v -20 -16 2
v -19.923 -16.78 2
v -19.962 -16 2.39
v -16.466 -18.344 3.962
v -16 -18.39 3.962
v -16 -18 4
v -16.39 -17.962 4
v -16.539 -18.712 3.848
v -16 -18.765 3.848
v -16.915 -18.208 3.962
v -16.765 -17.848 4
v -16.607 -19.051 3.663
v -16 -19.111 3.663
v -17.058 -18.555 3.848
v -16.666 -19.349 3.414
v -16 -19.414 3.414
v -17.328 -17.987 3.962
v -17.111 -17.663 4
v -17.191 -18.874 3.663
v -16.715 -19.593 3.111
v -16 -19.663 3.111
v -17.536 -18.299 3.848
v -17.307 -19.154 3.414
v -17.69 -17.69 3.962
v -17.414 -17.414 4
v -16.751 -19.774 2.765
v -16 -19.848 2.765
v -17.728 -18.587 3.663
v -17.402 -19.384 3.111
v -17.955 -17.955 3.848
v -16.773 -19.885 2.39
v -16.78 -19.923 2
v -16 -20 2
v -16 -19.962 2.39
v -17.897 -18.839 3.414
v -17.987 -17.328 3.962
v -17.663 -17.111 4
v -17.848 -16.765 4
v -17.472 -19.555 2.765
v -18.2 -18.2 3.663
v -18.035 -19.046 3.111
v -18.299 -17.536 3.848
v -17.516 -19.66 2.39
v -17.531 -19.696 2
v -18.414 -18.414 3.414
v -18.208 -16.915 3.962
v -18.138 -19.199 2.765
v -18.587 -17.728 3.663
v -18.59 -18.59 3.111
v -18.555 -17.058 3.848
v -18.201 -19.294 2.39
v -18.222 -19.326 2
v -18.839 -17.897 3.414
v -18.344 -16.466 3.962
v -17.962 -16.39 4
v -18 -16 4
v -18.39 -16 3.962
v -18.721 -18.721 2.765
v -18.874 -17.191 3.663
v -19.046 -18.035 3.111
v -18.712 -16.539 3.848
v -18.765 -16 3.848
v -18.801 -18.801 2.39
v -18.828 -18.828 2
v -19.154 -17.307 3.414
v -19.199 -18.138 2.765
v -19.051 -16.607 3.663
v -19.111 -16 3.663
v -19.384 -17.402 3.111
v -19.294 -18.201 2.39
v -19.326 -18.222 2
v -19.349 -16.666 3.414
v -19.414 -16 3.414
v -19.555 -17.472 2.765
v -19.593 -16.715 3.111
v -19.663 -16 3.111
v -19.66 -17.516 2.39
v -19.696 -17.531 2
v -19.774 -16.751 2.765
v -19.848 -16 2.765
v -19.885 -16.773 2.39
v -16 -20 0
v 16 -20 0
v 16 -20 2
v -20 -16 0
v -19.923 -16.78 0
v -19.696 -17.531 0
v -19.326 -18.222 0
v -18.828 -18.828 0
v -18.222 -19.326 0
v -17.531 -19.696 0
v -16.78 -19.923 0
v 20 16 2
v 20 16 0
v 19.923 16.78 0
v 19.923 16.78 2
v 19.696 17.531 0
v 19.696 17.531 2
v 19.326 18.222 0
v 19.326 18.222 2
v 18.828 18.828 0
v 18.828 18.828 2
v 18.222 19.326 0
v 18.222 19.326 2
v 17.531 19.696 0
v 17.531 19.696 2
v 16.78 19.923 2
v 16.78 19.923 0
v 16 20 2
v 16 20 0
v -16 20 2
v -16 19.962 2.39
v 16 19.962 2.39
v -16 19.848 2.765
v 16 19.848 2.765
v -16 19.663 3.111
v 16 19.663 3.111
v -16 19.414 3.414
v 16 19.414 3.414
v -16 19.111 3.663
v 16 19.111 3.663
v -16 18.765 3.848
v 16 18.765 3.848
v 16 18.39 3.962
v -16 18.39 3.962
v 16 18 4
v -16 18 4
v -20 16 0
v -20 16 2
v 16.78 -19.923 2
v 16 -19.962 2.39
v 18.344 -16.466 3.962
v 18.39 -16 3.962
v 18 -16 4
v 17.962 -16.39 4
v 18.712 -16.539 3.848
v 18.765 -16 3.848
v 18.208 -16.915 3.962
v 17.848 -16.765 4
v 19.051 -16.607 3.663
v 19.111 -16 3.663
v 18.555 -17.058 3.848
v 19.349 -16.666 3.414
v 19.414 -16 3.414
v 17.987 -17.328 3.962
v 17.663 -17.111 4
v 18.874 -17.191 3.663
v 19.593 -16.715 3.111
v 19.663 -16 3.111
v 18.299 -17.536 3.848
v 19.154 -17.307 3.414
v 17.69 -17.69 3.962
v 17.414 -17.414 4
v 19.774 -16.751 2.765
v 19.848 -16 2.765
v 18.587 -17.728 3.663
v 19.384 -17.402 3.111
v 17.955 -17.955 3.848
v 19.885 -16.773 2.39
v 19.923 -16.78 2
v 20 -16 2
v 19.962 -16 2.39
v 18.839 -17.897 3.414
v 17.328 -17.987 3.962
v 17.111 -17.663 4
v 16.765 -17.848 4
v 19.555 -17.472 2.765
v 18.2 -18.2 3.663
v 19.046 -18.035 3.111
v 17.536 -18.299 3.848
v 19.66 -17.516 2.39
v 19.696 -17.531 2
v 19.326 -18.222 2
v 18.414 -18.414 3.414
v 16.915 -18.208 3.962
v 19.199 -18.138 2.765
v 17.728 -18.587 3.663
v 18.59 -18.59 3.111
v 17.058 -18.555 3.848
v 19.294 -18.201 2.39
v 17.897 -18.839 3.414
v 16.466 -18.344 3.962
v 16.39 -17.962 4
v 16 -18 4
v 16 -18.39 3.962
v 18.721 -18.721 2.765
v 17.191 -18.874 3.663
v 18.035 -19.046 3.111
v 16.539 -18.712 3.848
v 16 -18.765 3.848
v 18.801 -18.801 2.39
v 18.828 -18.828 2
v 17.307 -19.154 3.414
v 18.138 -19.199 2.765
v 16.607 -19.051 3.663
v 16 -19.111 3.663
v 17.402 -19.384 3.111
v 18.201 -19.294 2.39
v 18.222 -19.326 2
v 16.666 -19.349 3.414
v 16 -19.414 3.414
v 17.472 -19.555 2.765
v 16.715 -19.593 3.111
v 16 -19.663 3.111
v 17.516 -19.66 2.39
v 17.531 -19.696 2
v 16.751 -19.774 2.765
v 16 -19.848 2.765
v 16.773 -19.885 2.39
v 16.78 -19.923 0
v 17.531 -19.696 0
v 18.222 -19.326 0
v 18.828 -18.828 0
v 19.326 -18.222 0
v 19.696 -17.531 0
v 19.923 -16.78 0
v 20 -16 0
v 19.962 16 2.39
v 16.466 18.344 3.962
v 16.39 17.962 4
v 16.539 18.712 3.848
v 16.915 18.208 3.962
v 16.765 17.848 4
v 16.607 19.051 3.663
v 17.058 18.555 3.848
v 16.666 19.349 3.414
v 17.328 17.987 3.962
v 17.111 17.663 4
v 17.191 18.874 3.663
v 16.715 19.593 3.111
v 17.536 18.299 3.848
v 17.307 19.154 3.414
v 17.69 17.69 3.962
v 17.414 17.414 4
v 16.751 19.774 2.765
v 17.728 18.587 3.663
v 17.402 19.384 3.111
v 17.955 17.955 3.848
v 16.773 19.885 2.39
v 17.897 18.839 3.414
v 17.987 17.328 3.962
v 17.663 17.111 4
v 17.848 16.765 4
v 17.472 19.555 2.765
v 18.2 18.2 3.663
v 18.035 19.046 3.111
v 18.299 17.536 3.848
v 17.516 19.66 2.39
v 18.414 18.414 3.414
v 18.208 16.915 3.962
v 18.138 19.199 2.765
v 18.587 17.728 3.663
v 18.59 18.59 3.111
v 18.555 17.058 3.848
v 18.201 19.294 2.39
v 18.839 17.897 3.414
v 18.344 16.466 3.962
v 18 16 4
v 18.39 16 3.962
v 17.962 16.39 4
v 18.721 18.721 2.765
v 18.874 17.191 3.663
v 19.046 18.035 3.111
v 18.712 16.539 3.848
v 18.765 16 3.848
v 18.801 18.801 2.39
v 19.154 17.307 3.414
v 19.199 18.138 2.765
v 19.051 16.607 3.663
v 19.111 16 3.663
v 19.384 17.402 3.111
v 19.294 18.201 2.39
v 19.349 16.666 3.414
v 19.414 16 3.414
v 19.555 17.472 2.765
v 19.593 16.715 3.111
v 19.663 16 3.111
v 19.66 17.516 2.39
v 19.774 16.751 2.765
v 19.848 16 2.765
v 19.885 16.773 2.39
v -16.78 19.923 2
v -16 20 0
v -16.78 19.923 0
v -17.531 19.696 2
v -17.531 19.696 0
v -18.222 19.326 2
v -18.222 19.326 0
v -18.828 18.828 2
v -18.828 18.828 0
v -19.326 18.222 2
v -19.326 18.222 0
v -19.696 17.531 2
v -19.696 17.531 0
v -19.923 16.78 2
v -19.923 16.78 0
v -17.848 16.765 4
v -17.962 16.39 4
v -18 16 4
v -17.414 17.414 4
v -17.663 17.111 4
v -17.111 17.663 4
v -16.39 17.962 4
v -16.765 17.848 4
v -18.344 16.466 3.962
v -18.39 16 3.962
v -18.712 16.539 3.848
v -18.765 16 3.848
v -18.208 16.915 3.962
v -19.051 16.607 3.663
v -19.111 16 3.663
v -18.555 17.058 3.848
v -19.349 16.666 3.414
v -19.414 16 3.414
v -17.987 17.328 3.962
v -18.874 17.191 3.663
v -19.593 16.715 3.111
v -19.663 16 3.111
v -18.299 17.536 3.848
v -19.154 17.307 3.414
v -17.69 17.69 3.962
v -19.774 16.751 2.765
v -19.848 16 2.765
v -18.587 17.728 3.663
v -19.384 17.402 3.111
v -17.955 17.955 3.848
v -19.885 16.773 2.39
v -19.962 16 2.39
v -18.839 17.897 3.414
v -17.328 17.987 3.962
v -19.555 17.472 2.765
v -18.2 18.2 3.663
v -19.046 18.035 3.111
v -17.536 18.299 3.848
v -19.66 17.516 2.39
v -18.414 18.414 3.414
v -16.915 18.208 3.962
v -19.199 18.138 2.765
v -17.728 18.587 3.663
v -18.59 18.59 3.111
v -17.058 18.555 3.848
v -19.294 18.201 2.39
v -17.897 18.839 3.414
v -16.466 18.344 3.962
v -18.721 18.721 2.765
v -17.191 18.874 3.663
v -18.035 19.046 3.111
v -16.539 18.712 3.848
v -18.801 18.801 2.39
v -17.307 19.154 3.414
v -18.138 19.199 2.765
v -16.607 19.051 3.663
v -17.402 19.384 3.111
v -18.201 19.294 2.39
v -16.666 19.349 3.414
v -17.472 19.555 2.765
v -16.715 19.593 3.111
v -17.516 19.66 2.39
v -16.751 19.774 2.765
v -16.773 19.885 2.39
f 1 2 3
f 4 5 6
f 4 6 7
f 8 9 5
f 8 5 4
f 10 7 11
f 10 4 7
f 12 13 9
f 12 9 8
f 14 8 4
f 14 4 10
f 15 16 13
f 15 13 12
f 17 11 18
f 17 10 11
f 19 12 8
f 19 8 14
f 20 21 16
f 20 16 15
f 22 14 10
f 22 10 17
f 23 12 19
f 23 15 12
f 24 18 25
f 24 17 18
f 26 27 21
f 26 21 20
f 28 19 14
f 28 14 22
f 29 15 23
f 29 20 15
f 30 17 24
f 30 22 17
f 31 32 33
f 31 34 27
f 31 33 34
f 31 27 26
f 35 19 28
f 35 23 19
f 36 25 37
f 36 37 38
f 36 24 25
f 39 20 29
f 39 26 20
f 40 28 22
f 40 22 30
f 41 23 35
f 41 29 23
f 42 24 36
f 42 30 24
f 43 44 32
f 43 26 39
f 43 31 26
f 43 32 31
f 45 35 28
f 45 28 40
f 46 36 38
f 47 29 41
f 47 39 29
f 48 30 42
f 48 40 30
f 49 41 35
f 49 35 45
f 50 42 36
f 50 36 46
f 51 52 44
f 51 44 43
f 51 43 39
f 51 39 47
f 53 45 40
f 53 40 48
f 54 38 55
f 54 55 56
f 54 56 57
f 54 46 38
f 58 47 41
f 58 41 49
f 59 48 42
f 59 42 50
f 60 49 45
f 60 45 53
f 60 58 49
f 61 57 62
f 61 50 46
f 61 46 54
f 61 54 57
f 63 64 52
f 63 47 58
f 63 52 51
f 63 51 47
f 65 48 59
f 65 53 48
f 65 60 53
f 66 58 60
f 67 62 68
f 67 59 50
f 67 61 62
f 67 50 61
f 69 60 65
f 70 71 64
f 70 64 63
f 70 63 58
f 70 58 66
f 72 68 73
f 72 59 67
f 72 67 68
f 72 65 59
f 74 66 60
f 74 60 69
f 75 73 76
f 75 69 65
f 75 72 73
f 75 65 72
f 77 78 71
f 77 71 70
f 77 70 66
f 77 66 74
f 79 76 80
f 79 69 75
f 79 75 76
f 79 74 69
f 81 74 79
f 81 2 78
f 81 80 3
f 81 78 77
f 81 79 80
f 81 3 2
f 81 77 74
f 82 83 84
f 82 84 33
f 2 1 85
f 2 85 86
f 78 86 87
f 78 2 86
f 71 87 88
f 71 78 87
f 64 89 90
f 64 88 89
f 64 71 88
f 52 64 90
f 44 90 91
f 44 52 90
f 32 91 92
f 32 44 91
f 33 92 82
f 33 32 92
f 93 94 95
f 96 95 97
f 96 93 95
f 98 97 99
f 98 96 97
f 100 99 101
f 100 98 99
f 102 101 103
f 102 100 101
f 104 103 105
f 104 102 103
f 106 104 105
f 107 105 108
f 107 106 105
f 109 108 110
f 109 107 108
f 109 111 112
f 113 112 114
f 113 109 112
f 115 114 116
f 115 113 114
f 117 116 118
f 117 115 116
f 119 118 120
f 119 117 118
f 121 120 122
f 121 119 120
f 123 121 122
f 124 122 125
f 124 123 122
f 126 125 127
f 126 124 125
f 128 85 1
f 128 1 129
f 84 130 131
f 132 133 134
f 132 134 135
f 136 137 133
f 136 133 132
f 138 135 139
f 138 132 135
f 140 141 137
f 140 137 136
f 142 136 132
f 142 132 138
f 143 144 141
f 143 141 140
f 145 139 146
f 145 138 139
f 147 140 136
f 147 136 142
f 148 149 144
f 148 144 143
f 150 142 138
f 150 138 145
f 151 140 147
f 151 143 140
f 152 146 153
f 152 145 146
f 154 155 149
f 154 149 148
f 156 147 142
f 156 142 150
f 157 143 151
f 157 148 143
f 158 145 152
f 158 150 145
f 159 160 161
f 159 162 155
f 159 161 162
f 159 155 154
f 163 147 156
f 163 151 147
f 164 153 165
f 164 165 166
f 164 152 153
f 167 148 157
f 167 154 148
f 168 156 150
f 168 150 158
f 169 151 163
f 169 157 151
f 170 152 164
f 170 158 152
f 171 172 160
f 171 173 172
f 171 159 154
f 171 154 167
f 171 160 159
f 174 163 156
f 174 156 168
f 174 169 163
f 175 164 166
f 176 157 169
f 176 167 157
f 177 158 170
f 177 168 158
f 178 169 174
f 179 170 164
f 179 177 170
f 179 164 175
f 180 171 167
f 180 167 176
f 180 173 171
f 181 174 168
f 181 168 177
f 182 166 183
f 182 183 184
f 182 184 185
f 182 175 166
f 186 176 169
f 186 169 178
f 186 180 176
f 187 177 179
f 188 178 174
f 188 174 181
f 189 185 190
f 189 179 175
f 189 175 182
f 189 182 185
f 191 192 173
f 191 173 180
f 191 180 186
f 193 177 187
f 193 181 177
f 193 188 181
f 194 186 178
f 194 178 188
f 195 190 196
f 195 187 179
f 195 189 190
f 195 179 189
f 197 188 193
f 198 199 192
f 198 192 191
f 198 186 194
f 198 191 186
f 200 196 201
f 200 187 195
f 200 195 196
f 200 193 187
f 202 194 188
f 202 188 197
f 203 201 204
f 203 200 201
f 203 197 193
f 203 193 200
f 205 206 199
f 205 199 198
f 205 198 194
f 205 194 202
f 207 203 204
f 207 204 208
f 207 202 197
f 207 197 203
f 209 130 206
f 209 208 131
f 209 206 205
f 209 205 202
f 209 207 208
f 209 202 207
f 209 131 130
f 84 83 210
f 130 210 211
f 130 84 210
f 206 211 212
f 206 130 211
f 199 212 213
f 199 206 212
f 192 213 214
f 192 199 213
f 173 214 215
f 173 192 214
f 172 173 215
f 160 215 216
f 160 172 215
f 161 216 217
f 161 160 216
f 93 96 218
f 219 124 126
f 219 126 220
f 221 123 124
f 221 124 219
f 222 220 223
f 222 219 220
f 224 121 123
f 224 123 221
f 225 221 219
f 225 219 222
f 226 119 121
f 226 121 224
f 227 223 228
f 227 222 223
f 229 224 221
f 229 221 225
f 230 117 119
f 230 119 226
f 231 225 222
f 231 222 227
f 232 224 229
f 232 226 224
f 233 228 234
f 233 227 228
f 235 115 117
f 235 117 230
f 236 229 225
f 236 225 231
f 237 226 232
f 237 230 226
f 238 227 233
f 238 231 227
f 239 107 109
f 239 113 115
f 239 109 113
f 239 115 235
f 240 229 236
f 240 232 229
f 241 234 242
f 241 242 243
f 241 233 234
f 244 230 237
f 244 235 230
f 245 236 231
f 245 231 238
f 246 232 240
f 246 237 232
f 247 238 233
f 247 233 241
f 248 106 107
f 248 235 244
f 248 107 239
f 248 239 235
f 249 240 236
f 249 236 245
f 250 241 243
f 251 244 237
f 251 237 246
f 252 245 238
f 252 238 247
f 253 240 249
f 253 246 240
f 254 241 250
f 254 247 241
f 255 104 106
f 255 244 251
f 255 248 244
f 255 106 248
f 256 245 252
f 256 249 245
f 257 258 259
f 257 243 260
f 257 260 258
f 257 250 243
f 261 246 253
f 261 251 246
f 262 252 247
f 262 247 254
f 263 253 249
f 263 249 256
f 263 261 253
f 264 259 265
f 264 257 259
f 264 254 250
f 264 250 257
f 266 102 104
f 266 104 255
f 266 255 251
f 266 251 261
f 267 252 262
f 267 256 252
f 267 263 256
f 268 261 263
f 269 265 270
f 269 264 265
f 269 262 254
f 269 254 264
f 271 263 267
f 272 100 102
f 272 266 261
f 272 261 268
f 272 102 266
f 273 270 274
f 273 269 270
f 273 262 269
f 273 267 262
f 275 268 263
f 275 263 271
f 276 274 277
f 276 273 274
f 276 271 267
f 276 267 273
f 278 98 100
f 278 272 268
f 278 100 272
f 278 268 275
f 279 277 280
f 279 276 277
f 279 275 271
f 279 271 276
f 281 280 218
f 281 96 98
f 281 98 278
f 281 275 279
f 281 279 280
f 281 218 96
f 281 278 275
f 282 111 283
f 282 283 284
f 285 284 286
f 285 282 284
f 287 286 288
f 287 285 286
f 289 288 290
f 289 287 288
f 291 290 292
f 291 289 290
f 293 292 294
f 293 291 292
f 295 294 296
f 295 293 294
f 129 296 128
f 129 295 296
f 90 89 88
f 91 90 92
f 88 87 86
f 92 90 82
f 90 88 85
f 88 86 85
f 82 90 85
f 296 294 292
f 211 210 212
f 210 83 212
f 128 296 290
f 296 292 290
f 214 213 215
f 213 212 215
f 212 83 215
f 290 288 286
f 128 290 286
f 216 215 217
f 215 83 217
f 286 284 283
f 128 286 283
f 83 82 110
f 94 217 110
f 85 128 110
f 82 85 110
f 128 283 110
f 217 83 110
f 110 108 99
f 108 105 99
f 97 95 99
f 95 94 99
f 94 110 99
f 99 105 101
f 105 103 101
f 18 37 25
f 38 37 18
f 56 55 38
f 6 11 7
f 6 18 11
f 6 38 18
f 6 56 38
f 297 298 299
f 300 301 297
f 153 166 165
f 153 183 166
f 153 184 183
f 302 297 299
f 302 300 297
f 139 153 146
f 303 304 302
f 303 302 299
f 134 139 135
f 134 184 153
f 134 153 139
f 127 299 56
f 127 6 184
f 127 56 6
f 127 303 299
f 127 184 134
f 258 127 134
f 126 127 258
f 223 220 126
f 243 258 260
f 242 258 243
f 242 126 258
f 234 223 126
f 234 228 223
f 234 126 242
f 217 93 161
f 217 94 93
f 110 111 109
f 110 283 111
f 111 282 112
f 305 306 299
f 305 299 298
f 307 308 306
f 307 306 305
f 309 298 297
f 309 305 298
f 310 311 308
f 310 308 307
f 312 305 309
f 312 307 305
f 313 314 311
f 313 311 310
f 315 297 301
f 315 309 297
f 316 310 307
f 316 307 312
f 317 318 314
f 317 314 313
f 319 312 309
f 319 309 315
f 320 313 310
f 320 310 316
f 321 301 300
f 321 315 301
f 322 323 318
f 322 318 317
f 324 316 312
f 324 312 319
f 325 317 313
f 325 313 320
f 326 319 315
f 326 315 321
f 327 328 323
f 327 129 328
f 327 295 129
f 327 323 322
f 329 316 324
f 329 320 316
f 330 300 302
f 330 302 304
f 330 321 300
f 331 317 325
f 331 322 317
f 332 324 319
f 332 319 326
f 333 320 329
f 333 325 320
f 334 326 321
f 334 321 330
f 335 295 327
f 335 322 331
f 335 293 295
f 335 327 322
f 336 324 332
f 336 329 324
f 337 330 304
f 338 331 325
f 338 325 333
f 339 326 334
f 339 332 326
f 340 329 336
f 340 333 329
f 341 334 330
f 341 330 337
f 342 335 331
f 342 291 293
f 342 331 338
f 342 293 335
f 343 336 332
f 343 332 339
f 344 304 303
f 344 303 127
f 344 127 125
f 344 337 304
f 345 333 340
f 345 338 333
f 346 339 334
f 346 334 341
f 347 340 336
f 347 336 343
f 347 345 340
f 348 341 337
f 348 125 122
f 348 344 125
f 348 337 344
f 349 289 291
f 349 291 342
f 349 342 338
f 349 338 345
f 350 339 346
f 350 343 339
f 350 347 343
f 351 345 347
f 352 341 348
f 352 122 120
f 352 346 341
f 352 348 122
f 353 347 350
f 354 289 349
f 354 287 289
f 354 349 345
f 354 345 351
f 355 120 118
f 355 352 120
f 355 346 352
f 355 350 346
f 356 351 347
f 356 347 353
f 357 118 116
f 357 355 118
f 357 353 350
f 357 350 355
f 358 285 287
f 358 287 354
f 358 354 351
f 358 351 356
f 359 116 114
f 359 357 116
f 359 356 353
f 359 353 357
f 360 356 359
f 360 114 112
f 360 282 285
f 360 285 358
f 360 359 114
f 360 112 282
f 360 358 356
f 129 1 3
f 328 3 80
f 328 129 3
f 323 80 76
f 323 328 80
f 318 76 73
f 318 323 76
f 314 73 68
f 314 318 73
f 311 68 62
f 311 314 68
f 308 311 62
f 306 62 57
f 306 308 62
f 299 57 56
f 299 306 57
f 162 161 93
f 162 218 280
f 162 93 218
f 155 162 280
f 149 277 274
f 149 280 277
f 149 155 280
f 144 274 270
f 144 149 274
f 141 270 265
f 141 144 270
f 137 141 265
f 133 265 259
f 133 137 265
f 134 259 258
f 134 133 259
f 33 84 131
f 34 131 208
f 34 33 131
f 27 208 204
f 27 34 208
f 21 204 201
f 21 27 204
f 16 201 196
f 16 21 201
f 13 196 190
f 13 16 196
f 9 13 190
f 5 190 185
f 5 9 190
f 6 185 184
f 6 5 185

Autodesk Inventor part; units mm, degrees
ref_plane "YZ Plane" through (0, 0, 0) normal (1, 0, 0) x (0, 1, 0)
ref_plane "XZ Plane" through (0, 0, 0) normal (0, 1, 0) x (-1, 0, 0)
ref_plane "XY Plane" through (0, 0, 0) normal (0, 0, 1) x (1, 0, 0)
sketch "Skizze1" plane through (0, 0, 0) normal (0, 0, 1) x (1, 0, 0)
  line L0 (-20, 20) -> (20, 20)
  line L1 (20, 20) -> (20, -20)
  line L2 (20, -20) -> (-20, -20)
  line L3 (-20, -20) -> (-20, 20)
  line L4 (-20, 20) -> (20, -20) construction
  line L5 (20, 20) -> (-20, -20) construction
  point P0 (0, 0)
  dimension "d0" = 40
  dimension "d1" = 40
extrude "Extrusion1" add sketch "Skizze1" along normal blind 4
fillet "Rundung1" radius 4 4 edges at (-20, -20, 2) (20, -20, 2) (-20, 20, 2) (20, 20, 2)
fillet "Rundung2" radius 2 8 edges at (18.8284, -18.8284, 4) (20, 0, 4) (18.8284, 18.8284, 4) (0, 20, 4) (-18.8284, 18.8284, 4) (-20, 0, 4) (-18.8284, -18.8284, 4) (0, -20, 4)
properties part number "Abdeckkappe-40x40x4"
